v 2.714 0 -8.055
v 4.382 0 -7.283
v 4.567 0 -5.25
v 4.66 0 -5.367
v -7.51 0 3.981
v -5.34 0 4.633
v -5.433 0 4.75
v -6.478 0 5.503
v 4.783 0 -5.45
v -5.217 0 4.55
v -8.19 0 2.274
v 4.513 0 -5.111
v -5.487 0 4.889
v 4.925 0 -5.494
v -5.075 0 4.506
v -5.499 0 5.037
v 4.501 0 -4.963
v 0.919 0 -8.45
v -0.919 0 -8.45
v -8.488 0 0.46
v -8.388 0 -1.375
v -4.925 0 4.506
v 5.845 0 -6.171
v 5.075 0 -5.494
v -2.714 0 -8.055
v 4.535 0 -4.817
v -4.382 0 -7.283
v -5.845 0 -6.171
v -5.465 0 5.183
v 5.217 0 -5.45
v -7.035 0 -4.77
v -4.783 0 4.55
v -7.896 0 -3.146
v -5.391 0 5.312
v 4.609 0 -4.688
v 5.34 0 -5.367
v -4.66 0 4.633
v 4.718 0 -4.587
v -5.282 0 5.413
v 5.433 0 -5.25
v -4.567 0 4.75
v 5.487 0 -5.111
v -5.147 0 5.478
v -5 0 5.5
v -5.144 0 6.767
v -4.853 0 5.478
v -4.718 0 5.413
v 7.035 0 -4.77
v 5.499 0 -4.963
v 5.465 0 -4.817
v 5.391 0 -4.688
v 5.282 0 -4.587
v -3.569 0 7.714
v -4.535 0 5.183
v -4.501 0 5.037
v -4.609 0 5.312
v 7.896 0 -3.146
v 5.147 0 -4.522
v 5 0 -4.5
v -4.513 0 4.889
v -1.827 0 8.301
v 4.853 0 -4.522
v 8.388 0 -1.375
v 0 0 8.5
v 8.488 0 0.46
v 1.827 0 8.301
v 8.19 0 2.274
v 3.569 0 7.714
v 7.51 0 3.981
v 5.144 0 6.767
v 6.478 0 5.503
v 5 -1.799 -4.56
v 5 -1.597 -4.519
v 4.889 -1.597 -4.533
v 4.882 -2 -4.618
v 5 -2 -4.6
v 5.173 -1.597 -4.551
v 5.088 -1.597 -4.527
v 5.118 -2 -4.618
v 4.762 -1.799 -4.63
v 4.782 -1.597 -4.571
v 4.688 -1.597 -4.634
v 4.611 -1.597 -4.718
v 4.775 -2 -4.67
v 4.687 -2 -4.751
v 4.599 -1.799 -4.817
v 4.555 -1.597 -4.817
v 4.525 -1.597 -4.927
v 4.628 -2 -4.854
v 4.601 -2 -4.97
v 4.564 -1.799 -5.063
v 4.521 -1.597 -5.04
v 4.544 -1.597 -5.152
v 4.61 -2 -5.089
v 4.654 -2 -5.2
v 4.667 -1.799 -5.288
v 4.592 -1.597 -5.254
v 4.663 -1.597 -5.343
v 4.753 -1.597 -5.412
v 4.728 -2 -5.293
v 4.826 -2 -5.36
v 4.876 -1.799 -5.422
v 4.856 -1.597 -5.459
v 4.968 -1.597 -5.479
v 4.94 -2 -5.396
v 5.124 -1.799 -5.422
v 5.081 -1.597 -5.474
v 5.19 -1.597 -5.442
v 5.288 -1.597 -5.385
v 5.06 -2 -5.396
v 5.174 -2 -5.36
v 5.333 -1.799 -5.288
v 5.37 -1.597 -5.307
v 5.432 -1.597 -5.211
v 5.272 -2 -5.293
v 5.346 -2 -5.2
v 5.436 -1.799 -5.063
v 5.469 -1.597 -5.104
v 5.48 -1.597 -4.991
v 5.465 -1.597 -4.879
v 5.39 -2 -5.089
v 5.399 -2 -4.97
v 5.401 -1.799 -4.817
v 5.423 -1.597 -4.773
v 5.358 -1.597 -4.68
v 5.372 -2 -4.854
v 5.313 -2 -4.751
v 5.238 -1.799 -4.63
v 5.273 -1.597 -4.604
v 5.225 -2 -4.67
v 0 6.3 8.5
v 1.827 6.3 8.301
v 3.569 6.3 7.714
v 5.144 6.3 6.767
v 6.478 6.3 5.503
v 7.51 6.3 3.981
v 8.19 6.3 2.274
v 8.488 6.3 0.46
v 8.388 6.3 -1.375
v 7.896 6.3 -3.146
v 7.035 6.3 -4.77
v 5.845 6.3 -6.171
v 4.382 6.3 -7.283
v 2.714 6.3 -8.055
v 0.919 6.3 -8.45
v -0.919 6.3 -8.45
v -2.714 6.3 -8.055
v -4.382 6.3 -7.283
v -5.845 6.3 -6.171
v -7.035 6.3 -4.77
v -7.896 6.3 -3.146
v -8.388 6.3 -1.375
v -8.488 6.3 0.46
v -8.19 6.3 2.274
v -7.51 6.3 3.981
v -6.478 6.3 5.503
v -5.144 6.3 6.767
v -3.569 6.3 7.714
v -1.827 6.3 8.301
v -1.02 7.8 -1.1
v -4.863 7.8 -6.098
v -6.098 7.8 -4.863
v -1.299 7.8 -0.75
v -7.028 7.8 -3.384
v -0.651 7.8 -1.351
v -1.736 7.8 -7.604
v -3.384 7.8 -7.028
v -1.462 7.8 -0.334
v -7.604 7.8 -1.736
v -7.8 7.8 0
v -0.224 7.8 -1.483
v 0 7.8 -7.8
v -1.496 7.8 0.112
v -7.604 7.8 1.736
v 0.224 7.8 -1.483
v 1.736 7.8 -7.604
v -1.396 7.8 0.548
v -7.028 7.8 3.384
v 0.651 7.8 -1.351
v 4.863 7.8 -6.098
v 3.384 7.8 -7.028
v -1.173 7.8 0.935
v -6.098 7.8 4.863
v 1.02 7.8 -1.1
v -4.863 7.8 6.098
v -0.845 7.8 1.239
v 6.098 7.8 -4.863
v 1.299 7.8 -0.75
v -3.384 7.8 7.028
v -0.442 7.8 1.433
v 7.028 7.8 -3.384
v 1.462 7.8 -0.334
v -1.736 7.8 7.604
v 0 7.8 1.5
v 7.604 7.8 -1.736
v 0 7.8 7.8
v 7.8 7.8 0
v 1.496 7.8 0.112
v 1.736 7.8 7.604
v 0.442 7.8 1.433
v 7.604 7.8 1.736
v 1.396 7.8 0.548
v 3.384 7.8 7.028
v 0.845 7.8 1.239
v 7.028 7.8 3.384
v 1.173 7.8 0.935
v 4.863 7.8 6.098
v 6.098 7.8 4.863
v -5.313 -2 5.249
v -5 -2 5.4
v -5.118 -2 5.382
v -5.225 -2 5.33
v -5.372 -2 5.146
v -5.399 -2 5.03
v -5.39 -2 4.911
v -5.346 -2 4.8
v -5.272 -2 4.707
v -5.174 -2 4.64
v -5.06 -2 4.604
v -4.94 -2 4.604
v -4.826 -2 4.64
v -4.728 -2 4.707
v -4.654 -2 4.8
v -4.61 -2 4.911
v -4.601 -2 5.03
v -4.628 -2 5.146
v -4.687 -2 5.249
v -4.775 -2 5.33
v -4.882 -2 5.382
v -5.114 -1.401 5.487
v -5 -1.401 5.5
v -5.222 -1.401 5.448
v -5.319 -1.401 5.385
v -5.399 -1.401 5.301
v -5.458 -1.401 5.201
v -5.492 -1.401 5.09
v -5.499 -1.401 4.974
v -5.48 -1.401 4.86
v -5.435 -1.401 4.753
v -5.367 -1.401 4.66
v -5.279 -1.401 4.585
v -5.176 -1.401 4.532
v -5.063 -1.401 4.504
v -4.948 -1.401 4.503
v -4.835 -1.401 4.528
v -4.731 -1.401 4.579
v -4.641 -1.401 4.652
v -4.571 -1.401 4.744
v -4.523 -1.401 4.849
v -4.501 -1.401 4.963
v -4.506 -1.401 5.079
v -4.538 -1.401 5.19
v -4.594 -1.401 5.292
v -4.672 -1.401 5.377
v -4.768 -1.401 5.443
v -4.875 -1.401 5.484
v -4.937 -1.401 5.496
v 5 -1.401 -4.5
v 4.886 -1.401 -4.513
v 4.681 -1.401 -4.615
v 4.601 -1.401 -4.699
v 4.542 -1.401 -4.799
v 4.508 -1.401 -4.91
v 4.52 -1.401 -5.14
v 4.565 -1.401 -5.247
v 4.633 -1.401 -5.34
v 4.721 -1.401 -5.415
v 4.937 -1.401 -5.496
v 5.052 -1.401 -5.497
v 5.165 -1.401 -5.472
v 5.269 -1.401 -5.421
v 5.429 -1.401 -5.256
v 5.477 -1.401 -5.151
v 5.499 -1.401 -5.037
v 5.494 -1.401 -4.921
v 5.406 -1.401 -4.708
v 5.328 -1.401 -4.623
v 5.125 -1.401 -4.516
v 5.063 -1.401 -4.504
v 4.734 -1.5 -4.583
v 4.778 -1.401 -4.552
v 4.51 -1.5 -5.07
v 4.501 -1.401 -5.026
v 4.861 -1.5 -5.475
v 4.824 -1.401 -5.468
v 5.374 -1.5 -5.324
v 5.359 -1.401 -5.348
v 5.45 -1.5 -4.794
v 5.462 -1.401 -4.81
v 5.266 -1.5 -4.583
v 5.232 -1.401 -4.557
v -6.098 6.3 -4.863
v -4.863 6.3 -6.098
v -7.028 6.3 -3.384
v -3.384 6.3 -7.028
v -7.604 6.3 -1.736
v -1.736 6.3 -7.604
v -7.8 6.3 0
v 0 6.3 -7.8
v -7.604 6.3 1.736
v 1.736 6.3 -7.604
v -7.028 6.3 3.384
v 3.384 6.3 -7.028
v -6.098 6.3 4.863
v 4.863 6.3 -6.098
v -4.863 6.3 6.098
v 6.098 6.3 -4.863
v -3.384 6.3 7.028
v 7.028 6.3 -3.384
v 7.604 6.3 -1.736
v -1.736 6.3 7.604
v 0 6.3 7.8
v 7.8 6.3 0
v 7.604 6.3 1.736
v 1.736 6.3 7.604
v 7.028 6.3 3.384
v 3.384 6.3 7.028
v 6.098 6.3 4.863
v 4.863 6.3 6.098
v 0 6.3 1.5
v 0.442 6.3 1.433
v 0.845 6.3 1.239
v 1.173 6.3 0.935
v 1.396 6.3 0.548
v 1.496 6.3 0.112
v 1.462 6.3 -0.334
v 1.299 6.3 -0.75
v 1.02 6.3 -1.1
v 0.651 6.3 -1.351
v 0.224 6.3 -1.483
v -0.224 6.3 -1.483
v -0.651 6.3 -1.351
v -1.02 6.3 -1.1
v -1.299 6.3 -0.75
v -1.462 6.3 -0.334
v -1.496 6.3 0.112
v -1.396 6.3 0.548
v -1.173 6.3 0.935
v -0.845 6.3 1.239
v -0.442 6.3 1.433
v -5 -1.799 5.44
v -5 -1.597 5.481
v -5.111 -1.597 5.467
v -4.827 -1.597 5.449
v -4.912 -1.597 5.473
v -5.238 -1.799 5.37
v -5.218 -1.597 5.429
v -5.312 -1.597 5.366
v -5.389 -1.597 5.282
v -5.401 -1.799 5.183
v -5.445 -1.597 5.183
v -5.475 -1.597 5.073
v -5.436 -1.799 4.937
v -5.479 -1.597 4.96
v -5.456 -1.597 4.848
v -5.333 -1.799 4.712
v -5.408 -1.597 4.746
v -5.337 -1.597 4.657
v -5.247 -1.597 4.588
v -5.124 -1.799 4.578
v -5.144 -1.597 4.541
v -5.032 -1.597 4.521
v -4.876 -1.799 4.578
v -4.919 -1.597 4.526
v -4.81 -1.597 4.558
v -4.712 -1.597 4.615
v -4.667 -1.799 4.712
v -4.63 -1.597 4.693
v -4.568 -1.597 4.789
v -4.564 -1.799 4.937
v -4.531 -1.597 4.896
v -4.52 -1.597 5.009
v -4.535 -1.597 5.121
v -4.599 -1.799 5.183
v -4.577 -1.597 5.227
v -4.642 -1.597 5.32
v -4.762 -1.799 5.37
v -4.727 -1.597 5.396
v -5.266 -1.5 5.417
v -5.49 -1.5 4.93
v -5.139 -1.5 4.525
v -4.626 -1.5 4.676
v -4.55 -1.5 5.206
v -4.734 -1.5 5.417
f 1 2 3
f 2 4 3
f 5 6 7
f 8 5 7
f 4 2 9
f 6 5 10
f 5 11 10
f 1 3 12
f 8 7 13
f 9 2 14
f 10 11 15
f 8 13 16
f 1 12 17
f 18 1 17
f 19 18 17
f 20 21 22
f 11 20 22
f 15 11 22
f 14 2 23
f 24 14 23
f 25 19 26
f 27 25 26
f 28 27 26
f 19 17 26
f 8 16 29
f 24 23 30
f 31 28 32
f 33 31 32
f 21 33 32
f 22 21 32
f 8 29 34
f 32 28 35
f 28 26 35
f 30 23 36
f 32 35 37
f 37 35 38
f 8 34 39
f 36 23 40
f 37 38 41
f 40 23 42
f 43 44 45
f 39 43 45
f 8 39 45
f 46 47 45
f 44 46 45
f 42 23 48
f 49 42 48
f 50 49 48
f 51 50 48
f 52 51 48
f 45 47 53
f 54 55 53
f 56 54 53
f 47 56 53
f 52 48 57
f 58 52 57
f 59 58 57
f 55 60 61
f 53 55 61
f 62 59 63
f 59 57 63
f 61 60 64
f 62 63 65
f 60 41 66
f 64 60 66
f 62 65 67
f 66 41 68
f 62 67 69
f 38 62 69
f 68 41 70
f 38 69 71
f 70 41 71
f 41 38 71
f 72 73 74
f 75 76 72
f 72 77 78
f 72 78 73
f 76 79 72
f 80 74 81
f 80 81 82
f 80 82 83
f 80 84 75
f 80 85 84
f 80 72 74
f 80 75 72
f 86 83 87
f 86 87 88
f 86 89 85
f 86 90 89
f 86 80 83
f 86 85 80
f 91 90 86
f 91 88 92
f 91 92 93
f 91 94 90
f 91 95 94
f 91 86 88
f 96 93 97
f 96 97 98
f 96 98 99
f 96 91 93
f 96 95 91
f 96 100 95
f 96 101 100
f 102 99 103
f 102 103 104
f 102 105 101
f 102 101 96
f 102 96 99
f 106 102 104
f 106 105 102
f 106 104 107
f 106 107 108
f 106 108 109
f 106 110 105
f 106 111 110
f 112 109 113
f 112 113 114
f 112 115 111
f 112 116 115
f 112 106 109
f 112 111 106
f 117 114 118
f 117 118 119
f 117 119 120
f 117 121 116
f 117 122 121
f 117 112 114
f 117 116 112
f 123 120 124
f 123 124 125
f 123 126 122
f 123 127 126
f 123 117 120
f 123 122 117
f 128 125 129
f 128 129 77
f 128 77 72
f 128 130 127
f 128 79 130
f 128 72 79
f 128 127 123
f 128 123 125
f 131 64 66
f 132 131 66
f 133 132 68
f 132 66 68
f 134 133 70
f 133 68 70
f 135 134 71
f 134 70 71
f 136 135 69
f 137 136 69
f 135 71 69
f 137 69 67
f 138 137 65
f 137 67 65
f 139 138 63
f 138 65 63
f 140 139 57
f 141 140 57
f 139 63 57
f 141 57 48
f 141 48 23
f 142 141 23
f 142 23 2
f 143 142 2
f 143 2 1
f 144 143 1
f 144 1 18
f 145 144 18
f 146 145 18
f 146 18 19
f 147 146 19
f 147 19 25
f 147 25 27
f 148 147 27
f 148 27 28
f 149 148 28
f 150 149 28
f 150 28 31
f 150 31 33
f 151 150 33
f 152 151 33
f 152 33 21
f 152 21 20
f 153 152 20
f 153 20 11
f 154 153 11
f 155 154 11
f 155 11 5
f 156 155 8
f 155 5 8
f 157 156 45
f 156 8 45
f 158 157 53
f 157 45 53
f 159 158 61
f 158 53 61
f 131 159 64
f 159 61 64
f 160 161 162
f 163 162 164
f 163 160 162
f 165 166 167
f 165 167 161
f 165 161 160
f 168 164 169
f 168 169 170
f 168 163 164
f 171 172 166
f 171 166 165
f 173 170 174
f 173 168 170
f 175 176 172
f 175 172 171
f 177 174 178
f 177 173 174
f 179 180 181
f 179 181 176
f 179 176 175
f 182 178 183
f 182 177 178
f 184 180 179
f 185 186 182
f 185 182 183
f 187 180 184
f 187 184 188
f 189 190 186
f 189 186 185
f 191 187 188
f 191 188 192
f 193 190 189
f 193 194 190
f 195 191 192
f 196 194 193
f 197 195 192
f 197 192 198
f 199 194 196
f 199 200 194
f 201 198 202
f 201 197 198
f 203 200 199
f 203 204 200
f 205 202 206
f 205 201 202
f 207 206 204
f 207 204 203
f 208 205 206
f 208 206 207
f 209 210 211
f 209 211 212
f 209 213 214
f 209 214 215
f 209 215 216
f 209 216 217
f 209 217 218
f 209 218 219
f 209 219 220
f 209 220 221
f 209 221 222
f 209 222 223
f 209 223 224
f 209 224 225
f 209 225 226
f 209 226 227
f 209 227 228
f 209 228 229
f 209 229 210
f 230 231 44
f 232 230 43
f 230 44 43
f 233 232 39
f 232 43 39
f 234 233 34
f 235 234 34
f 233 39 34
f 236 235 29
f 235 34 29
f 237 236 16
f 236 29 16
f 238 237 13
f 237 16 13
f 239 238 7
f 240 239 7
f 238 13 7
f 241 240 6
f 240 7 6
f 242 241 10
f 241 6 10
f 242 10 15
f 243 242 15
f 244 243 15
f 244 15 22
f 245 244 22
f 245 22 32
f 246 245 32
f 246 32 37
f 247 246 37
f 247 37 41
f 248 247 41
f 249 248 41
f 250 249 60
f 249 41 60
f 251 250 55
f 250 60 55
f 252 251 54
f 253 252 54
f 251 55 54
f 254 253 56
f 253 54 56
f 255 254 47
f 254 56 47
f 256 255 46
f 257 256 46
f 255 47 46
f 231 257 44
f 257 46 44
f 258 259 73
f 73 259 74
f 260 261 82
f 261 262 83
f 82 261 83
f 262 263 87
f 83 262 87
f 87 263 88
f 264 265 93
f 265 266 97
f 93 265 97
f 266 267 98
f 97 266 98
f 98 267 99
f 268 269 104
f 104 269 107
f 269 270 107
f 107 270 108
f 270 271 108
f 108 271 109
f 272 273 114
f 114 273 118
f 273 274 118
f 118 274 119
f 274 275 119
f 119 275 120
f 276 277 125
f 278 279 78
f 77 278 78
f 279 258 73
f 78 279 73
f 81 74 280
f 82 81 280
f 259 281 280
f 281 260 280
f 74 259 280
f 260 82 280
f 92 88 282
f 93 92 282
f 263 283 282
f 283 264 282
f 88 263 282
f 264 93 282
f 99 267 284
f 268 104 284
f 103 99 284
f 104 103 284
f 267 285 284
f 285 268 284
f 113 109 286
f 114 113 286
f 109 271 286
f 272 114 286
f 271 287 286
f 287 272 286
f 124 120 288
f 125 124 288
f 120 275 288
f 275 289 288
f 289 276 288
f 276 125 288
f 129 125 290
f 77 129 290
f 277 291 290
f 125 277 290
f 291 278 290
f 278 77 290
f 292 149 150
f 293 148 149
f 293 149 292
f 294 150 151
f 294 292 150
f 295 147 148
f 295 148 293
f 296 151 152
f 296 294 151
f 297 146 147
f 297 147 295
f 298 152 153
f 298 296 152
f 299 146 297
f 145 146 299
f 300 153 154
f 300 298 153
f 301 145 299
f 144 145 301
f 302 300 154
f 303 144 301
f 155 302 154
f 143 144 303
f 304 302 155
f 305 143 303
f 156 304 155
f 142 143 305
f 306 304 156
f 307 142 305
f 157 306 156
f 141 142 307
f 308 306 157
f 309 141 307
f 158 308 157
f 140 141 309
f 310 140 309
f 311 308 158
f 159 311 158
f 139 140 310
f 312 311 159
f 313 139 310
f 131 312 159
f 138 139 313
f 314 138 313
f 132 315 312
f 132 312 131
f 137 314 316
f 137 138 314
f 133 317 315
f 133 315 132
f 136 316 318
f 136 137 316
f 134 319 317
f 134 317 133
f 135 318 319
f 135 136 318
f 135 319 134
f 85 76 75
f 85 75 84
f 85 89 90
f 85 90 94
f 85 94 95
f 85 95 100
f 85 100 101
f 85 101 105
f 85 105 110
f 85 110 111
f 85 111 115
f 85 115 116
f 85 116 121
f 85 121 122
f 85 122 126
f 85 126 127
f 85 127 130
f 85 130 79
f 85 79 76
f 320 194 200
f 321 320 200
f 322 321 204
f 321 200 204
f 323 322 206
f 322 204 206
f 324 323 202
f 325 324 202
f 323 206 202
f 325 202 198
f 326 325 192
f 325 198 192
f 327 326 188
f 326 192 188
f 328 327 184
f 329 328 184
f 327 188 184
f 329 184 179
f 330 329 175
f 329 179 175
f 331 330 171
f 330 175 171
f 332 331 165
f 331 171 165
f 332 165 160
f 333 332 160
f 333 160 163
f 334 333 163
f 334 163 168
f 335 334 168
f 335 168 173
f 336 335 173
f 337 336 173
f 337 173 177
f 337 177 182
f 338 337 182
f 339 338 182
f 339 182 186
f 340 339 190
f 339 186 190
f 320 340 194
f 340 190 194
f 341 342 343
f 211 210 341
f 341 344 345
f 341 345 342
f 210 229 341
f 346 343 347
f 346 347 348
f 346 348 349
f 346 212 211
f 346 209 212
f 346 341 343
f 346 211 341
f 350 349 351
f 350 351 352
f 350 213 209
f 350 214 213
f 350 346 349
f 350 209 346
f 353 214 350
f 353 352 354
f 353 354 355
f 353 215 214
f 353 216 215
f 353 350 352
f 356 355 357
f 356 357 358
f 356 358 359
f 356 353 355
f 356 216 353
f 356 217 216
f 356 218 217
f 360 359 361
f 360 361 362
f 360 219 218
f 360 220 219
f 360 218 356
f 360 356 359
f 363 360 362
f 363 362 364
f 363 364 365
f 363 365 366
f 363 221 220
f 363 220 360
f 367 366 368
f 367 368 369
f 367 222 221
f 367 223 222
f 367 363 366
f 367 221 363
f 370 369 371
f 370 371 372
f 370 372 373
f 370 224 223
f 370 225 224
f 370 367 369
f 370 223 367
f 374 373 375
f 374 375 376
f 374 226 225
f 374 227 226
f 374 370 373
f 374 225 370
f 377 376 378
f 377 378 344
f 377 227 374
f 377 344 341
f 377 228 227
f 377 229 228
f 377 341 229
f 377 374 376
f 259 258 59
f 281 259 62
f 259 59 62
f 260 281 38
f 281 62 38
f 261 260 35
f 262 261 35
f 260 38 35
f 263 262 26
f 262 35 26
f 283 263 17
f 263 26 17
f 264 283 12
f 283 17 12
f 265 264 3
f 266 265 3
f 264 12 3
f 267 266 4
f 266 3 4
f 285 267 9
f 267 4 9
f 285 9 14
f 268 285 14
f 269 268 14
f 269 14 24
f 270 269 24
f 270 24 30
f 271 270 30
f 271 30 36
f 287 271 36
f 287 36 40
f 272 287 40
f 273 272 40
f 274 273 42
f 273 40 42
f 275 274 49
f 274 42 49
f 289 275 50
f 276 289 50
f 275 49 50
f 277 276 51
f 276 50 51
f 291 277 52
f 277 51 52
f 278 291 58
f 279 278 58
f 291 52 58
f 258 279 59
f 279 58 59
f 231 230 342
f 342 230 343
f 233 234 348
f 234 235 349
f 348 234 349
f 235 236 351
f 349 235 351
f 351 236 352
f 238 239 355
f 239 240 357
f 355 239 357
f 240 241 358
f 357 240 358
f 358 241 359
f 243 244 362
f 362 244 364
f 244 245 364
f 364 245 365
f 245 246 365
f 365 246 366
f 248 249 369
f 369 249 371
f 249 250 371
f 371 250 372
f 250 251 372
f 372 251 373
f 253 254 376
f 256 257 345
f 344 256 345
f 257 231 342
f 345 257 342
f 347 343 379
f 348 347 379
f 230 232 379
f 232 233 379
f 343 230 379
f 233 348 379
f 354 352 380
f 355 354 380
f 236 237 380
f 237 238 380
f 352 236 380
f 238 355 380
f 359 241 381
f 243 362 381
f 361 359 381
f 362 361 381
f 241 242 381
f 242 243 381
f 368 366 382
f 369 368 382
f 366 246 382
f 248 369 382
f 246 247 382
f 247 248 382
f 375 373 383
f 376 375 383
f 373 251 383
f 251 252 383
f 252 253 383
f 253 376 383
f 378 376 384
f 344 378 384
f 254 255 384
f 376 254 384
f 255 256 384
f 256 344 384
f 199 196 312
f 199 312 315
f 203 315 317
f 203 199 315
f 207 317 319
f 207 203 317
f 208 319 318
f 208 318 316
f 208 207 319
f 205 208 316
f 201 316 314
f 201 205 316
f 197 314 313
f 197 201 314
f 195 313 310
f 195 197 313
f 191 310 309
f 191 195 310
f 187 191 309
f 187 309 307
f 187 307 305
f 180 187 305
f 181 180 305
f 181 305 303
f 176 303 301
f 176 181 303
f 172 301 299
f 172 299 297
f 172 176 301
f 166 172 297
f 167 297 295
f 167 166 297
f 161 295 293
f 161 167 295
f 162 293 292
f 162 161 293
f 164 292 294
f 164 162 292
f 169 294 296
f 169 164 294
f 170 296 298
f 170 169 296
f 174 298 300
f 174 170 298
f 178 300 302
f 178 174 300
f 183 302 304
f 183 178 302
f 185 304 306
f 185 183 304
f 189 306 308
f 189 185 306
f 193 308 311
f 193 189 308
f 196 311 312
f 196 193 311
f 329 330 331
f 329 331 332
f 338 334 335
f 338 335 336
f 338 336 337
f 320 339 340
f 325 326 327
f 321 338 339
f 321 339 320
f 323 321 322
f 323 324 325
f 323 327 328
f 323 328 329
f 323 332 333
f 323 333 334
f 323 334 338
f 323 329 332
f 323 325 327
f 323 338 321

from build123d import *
from OCP.BRepFilletAPI import BRepFilletAPI_MakeChamfer

# Parameters (mm, degrees)
SKETCH1_R           = 8.5
BOSS_EXTRUDE1_DEPTH = 7.8
SKETCH2_R           = 8.5
SKETCH2_R_2         = 7.8
SKETCH2_R_3         = 1.5
CUT_EXTRUDE1_DEPTH  = 1.5
SKETCH3_R           = 0.5
BOSS_EXTRUDE2_DEPTH = 2
CHAMFER1_SIZE       = 0.5
CHAMFER1_SIZE2      = 0.1
FILLET1_R           = 1


with BuildPart() as part:
    # Sketch1 → Boss-Extrude1 (new body)
    with BuildSketch(Plane(origin=(0, 0, 0), x_dir=(1, 0, 0), z_dir=(0, 1, 0))):
        with Locations(Location((0, 0, 0), (0, 0, 270))):
            Circle(SKETCH1_R)
    extrude(amount=BOSS_EXTRUDE1_DEPTH)

    # Sketch2 → Cut-Extrude1 (cut)
    with BuildSketch(Plane(origin=(0, 7.8, 0), x_dir=(1, 0, 0), z_dir=(0, 1, 0))):
        with Locations(Location((0, 0, 0), (0, 0, 270))):
            Circle(SKETCH2_R)
        with Locations(Location((0, 0, 0), (0, 0, 270))):
            Circle(SKETCH2_R_2, mode=Mode.SUBTRACT)
        with Locations(Location((0, 0, 0), (0, 0, 270))):
            Circle(SKETCH2_R_3)
    extrude(amount=-CUT_EXTRUDE1_DEPTH, mode=Mode.SUBTRACT)

    # Sketch3 → Boss-Extrude2 (add)
    with BuildSketch(Plane.XZ):
        with Locations(Location((-5, 5, 0), (0, 0, 90))):
            Circle(SKETCH3_R)
        with Locations(Location((5, -5, 0), (0, 0, 90))):
            Circle(SKETCH3_R)
    extrude(amount=BOSS_EXTRUDE2_DEPTH)

    # Chamfer1: one chamfer whose edges measure the first distance from different faces: ONE call of the kernel's chamfer builder (chamfer() names one face for all edges)
    chamfer1_edges_1 = [part.edges().sort_by_distance(p)[0] for p in [
        (-5, -2, 4.5),
    ]]
    chamfer1_side_1 = [part.faces().sort_by_distance(p)[0] for p in [
        (-5, -1, 4.5),
    ]]
    chamfer1_edges_2 = [part.edges().sort_by_distance(p)[0] for p in [
        (5, -2, -5.5),
    ]]
    chamfer1_side_2 = [part.faces().sort_by_distance(p)[0] for p in [
        (5, -1, -5.5),
    ]]
    chamfer1 = BRepFilletAPI_MakeChamfer(part.part.solid().wrapped)
    for e in chamfer1_edges_1:
        chamfer1.Add(CHAMFER1_SIZE, CHAMFER1_SIZE2, e.wrapped, chamfer1_side_1[0].wrapped)  # the first distance lies on this face
    for e in chamfer1_edges_2:
        chamfer1.Add(CHAMFER1_SIZE, CHAMFER1_SIZE2, e.wrapped, chamfer1_side_2[0].wrapped)  # the first distance lies on this face
    add(Compound.cast(chamfer1.Shape()), mode=Mode.REPLACE)

    # Fillet1
    fillet1_edges = [part.edges().sort_by_distance(p)[0] for p in [
        (-5, -1.5, 4.5),
        (5, -1.5, -5.5),
    ]]
    fillet(fillet1_edges, radius=FILLET1_R)


solid = part.part
